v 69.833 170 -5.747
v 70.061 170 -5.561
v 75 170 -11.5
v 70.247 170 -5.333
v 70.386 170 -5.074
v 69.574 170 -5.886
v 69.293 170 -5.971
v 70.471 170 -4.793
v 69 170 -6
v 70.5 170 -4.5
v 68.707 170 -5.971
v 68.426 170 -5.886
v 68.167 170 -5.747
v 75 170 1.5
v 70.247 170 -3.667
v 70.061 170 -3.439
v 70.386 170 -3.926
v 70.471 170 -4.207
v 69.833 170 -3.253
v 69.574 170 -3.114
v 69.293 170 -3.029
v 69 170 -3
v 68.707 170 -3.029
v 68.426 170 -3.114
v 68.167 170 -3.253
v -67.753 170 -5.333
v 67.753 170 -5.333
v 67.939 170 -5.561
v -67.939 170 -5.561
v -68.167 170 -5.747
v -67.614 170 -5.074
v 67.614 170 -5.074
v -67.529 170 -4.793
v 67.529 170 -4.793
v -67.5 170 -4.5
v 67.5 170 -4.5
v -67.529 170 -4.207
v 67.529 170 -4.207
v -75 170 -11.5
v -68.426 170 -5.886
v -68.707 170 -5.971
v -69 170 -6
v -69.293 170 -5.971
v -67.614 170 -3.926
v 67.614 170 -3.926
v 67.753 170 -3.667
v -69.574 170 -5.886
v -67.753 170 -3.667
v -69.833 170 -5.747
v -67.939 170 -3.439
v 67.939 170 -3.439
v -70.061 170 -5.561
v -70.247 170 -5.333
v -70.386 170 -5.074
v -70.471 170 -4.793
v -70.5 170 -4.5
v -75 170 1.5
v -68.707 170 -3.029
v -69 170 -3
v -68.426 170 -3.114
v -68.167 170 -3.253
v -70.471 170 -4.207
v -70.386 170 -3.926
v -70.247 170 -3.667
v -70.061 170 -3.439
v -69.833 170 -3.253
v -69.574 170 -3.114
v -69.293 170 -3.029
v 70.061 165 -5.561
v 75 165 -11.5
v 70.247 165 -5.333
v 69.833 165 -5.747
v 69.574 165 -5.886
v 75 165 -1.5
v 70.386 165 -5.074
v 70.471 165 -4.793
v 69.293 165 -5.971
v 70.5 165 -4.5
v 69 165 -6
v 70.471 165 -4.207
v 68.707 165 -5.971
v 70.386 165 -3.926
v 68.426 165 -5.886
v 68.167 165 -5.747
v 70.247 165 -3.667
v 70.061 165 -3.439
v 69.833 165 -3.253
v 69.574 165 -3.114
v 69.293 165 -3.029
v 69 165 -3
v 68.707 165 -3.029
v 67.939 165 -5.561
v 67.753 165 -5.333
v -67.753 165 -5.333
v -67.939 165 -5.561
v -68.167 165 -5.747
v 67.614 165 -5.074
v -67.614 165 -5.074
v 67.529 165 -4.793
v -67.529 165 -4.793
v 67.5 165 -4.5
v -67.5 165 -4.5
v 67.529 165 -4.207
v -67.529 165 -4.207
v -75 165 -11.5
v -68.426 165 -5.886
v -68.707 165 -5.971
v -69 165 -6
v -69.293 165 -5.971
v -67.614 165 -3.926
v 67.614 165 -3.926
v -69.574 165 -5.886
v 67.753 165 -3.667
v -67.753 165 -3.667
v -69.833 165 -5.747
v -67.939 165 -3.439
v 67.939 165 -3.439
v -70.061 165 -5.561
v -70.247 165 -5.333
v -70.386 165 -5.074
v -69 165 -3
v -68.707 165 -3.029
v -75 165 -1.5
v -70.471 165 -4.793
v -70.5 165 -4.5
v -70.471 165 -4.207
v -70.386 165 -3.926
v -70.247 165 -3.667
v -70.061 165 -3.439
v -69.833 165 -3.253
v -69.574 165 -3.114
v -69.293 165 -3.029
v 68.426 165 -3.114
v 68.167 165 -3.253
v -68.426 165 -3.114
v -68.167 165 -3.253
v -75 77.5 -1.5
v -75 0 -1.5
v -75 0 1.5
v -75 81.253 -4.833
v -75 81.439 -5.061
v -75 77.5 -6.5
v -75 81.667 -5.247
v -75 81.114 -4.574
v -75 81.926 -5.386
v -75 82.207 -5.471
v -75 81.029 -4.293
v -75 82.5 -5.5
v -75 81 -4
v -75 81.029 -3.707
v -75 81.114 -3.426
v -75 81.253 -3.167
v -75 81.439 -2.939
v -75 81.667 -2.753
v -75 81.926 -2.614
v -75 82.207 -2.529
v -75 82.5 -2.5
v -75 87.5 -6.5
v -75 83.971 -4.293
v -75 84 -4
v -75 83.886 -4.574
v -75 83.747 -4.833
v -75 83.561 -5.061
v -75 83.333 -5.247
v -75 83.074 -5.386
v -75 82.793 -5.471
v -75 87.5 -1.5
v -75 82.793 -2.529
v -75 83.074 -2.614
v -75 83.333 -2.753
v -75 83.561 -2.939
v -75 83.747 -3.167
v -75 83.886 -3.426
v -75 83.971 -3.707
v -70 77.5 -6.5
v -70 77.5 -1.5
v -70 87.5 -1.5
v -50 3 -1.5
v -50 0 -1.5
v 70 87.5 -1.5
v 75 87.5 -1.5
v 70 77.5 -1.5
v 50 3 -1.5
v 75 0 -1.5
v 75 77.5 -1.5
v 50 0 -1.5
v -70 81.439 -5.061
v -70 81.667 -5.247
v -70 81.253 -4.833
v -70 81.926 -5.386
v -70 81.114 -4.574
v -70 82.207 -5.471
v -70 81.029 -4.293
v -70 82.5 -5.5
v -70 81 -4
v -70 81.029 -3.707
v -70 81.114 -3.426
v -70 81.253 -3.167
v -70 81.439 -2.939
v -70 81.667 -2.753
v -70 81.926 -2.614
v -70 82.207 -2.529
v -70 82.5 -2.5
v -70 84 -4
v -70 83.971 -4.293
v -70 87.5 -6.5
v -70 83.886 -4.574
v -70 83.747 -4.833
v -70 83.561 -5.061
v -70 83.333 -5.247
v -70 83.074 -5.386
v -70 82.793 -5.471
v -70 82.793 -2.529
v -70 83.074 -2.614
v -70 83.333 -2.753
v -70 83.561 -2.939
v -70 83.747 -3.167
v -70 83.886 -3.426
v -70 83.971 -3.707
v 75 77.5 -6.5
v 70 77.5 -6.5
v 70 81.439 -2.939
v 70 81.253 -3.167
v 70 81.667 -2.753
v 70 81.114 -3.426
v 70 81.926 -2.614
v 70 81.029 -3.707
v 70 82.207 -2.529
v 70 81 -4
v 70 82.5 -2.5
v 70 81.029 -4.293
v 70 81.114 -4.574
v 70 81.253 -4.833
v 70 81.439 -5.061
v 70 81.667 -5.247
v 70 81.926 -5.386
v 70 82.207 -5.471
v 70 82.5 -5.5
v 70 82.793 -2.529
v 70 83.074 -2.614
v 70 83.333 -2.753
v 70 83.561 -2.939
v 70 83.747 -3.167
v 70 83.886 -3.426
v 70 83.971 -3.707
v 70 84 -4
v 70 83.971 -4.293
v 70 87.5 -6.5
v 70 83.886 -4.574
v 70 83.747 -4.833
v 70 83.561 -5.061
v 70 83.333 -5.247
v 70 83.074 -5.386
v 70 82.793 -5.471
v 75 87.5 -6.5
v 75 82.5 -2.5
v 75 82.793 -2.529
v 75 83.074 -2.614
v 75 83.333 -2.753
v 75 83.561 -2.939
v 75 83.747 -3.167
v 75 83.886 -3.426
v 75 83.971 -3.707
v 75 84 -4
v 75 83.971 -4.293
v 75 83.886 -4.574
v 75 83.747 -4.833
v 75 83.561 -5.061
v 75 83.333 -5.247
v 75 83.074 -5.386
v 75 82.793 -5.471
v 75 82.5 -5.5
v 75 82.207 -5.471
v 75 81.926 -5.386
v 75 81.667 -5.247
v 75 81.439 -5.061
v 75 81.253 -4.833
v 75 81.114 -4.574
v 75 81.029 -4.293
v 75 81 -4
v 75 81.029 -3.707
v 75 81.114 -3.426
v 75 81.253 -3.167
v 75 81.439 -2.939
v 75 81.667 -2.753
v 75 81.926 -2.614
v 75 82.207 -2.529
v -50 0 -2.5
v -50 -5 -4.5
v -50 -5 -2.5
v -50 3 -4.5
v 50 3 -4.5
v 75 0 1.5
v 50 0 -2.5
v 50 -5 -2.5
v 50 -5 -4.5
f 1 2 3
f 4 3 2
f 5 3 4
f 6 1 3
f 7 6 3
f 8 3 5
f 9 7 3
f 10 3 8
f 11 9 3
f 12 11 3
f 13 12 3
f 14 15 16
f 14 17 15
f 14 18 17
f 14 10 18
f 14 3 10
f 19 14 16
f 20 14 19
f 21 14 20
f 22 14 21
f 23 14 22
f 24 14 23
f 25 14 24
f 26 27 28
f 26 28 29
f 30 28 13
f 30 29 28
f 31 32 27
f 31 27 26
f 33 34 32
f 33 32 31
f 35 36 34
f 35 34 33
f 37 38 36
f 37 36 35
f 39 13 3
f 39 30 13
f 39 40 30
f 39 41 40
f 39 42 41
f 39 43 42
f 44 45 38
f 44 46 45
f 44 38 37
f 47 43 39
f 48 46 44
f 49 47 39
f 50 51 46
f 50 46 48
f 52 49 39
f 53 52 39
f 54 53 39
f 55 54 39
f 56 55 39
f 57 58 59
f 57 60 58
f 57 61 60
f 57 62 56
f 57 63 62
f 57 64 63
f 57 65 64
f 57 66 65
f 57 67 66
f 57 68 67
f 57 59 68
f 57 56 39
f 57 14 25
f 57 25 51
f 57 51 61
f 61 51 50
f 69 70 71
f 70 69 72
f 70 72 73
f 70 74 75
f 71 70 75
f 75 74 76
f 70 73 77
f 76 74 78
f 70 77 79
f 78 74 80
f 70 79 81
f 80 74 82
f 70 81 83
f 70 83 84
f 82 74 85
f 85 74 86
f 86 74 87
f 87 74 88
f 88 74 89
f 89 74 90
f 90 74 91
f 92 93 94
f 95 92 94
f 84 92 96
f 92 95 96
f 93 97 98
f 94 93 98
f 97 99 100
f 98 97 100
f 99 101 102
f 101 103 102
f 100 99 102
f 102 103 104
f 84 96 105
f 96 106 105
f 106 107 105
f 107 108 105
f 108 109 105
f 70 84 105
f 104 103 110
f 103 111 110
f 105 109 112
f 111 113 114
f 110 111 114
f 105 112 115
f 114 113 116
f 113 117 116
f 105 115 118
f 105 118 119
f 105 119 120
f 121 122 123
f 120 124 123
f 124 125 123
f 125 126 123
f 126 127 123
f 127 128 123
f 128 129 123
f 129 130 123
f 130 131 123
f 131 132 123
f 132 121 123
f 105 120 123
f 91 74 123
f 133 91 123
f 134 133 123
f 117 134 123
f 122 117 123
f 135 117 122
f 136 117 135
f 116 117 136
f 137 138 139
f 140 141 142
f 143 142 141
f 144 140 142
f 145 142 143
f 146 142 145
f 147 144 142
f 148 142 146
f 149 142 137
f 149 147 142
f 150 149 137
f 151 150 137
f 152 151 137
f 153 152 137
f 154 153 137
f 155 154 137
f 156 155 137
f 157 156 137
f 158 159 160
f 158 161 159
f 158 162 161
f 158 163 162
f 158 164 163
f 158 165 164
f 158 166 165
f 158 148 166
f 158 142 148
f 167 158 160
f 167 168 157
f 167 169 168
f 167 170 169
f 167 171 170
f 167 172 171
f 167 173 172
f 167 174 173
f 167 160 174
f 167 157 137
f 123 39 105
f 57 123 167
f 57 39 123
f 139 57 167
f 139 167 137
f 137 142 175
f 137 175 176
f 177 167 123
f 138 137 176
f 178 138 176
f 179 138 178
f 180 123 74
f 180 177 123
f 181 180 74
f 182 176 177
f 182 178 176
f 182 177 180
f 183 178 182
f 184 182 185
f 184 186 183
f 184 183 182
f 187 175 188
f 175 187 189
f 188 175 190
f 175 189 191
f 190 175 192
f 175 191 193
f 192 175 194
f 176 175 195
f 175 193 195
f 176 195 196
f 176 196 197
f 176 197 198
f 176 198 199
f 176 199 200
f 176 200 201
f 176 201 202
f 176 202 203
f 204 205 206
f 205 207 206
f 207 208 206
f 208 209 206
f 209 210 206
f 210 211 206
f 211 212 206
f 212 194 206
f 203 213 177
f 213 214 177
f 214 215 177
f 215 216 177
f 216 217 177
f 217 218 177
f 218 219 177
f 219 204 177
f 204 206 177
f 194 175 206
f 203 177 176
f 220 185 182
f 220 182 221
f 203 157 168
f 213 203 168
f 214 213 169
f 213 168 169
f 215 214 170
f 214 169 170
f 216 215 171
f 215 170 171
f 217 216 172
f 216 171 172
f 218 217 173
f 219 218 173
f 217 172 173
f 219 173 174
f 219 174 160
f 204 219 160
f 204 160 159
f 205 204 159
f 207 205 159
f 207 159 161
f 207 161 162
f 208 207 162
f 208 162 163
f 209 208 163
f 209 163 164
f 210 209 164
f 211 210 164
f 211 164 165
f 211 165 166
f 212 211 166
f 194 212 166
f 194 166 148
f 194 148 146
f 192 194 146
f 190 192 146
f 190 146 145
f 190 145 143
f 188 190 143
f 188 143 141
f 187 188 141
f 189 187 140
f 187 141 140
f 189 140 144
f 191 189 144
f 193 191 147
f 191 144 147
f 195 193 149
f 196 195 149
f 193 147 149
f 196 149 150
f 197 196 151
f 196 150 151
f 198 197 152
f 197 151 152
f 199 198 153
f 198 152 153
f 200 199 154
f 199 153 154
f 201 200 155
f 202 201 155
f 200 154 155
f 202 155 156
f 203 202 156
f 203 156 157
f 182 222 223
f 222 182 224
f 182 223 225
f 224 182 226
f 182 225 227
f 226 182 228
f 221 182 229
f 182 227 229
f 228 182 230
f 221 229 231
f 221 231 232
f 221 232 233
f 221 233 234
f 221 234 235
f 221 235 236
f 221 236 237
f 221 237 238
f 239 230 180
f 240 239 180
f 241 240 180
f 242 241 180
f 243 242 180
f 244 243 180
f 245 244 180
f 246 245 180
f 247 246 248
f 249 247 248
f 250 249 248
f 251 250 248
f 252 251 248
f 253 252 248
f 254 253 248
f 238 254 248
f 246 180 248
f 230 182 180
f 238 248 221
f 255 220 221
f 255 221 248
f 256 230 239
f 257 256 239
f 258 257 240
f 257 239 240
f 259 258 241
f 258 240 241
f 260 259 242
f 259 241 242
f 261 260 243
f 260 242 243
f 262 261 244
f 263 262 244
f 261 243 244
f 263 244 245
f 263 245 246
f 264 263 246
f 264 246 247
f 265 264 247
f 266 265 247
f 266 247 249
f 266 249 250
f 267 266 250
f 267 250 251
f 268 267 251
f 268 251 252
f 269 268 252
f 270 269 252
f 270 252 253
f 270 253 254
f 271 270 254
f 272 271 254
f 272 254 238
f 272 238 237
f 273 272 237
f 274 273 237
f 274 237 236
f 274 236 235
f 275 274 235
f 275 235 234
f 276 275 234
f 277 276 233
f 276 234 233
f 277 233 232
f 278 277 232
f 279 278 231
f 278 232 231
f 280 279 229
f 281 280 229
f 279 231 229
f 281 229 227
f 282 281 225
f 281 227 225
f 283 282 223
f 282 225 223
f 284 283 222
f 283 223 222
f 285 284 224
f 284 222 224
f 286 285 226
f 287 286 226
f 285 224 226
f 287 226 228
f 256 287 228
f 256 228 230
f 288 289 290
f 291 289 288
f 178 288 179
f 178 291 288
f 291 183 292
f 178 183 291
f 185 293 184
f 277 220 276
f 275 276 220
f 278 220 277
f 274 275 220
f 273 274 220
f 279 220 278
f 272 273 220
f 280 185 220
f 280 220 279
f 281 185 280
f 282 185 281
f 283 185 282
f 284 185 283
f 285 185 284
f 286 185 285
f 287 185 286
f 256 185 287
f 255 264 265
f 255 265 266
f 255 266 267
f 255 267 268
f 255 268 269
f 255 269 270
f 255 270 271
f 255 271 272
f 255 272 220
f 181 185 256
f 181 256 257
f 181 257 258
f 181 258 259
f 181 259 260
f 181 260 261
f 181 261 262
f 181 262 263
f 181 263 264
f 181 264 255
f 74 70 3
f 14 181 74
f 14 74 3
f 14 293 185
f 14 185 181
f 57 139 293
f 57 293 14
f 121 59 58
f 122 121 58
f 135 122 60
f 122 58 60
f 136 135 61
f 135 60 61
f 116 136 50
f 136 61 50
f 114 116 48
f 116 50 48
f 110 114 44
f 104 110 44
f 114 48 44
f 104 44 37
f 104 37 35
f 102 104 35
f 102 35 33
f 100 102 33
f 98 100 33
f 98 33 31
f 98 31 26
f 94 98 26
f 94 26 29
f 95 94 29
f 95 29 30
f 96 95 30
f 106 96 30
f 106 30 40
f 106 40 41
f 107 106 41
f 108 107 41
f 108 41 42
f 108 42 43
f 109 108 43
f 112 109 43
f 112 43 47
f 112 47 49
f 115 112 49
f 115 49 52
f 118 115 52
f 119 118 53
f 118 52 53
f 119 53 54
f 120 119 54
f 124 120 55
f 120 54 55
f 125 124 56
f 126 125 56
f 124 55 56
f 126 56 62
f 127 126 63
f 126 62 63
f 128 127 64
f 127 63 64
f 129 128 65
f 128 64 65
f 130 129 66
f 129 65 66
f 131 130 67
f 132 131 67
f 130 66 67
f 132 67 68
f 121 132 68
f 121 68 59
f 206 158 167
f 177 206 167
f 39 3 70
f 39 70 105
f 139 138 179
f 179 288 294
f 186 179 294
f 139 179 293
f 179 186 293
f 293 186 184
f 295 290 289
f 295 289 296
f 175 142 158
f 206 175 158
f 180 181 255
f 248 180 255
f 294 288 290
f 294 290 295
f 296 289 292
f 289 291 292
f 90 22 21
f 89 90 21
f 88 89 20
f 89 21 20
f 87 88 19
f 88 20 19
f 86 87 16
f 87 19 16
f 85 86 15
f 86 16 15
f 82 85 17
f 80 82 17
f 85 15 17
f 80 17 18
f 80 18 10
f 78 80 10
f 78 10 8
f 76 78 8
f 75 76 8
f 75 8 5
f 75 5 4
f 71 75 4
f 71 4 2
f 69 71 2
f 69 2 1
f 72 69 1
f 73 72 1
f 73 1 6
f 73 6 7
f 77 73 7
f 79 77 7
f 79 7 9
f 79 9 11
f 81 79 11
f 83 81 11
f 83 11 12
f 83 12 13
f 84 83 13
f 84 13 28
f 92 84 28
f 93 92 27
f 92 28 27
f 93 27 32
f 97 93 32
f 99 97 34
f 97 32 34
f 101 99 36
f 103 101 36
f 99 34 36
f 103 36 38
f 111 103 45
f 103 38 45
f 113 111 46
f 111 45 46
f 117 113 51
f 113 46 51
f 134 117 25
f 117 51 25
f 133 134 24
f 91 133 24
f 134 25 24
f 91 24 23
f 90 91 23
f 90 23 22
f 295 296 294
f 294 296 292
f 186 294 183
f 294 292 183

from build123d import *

# Parameters (mm, degrees)
SKETCH1_W           = 150
SKETCH1_H           = 3
BOSS_EXTRUDE1_DEPTH = 170
SKETCH2_W           = 150
SKETCH2_H           = 5
BOSS_EXTRUDE2_DEPTH = 10
SKETCH3_W           = 100
SKETCH3_H           = 3
BOSS_EXTRUDE3_DEPTH = 3
SKETCH4_W           = 100
SKETCH4_H           = 3
BOSS_EXTRUDE4_DEPTH = 5
SKETCH5_R           = 1.5
CUT_EXTRUDE1_DEPTH  = 191.741316971
SKETCH6_W           = 8
SKETCH6_H           = 10
BOSS_EXTRUDE5_DEPTH = 5
SKETCH8_W           = 8
SKETCH8_H           = 10
BOSS_EXTRUDE6_DEPTH = 5
SKETCH9_R           = 1.5
CUT_EXTRUDE2_DEPTH  = 228.007158477
SKETCH10_W          = 100
SKETCH10_H          = 5
CUT_EXTRUDE3_DEPTH  = 1


with BuildPart() as part:
    # Sketch1 → Boss-Extrude1 (new body)
    with BuildSketch(Plane(origin=(0, 0, 0), x_dir=(1, 0, 0), z_dir=(0, 1, 0))):
        Rectangle(SKETCH1_W, SKETCH1_H)
    extrude(amount=BOSS_EXTRUDE1_DEPTH)

    # Sketch2 → Boss-Extrude2 (add)
    with BuildSketch(Plane(origin=(0, 0, -1.5), x_dir=(-1, 0, 0), z_dir=(0, 0, -1))):
        with Locations((0, 167.5)):
            Rectangle(SKETCH2_W, SKETCH2_H)
    extrude(amount=BOSS_EXTRUDE2_DEPTH)

    # Sketch3 → Boss-Extrude3 (add)
    with BuildSketch(Plane(origin=(0, 0, -1.5), x_dir=(-1, 0, 0), z_dir=(0, 0, -1))):
        with Locations((0, 1.5)):
            Rectangle(SKETCH3_W, SKETCH3_H)
    extrude(amount=BOSS_EXTRUDE3_DEPTH)

    # Sketch4 → Boss-Extrude4 (add)
    with BuildSketch(Plane.XZ):
        with Locations((0, -3)):
            Rectangle(SKETCH4_W, SKETCH4_H)
    extrude(amount=BOSS_EXTRUDE4_DEPTH)

    # Sketch5 → Cut-Extrude1 (cut, through all)
    with BuildSketch(Plane(origin=(0, 170, 0), x_dir=(1, 0, 0), z_dir=(0, 1, 0))):
        with Locations(Location((69, 4.5, 0), (0, 0, 270))):
            Circle(SKETCH5_R)
        with Locations(Location((-69, 4.5, 0), (0, 0, 270))):
            Circle(SKETCH5_R)
    extrude(amount=-CUT_EXTRUDE1_DEPTH, mode=Mode.SUBTRACT)

    # Sketch6 → Boss-Extrude5 (add)
    with BuildSketch(Plane(origin=(75, 0, 0), x_dir=(0, 0, -1), z_dir=(1, 0, 0))):
        with Locations((2.5, 82.5)):
            Rectangle(SKETCH6_W, SKETCH6_H)
    extrude(amount=-BOSS_EXTRUDE5_DEPTH)

    # Sketch8 → Boss-Extrude6 (add)
    with BuildSketch(Plane.ZY.offset(75)):
        with Locations((-2.5, 82.5)):
            Rectangle(SKETCH8_W, SKETCH8_H)
    extrude(amount=-BOSS_EXTRUDE6_DEPTH)

    # Sketch9 → Cut-Extrude2 (cut, through all)
    with BuildSketch(Plane.ZY.offset(75)):
        with Locations((-4, 82.5)):
            Circle(SKETCH9_R)
    extrude(amount=-CUT_EXTRUDE2_DEPTH, mode=Mode.SUBTRACT)

    # Sketch10 → Cut-Extrude3 (cut)
    with BuildSketch(Plane.XY.offset(-1.5)):
        with Locations((0, -2.5)):
            Rectangle(SKETCH10_W, SKETCH10_H)
    extrude(amount=-CUT_EXTRUDE3_DEPTH, mode=Mode.SUBTRACT)


solid = part.part
